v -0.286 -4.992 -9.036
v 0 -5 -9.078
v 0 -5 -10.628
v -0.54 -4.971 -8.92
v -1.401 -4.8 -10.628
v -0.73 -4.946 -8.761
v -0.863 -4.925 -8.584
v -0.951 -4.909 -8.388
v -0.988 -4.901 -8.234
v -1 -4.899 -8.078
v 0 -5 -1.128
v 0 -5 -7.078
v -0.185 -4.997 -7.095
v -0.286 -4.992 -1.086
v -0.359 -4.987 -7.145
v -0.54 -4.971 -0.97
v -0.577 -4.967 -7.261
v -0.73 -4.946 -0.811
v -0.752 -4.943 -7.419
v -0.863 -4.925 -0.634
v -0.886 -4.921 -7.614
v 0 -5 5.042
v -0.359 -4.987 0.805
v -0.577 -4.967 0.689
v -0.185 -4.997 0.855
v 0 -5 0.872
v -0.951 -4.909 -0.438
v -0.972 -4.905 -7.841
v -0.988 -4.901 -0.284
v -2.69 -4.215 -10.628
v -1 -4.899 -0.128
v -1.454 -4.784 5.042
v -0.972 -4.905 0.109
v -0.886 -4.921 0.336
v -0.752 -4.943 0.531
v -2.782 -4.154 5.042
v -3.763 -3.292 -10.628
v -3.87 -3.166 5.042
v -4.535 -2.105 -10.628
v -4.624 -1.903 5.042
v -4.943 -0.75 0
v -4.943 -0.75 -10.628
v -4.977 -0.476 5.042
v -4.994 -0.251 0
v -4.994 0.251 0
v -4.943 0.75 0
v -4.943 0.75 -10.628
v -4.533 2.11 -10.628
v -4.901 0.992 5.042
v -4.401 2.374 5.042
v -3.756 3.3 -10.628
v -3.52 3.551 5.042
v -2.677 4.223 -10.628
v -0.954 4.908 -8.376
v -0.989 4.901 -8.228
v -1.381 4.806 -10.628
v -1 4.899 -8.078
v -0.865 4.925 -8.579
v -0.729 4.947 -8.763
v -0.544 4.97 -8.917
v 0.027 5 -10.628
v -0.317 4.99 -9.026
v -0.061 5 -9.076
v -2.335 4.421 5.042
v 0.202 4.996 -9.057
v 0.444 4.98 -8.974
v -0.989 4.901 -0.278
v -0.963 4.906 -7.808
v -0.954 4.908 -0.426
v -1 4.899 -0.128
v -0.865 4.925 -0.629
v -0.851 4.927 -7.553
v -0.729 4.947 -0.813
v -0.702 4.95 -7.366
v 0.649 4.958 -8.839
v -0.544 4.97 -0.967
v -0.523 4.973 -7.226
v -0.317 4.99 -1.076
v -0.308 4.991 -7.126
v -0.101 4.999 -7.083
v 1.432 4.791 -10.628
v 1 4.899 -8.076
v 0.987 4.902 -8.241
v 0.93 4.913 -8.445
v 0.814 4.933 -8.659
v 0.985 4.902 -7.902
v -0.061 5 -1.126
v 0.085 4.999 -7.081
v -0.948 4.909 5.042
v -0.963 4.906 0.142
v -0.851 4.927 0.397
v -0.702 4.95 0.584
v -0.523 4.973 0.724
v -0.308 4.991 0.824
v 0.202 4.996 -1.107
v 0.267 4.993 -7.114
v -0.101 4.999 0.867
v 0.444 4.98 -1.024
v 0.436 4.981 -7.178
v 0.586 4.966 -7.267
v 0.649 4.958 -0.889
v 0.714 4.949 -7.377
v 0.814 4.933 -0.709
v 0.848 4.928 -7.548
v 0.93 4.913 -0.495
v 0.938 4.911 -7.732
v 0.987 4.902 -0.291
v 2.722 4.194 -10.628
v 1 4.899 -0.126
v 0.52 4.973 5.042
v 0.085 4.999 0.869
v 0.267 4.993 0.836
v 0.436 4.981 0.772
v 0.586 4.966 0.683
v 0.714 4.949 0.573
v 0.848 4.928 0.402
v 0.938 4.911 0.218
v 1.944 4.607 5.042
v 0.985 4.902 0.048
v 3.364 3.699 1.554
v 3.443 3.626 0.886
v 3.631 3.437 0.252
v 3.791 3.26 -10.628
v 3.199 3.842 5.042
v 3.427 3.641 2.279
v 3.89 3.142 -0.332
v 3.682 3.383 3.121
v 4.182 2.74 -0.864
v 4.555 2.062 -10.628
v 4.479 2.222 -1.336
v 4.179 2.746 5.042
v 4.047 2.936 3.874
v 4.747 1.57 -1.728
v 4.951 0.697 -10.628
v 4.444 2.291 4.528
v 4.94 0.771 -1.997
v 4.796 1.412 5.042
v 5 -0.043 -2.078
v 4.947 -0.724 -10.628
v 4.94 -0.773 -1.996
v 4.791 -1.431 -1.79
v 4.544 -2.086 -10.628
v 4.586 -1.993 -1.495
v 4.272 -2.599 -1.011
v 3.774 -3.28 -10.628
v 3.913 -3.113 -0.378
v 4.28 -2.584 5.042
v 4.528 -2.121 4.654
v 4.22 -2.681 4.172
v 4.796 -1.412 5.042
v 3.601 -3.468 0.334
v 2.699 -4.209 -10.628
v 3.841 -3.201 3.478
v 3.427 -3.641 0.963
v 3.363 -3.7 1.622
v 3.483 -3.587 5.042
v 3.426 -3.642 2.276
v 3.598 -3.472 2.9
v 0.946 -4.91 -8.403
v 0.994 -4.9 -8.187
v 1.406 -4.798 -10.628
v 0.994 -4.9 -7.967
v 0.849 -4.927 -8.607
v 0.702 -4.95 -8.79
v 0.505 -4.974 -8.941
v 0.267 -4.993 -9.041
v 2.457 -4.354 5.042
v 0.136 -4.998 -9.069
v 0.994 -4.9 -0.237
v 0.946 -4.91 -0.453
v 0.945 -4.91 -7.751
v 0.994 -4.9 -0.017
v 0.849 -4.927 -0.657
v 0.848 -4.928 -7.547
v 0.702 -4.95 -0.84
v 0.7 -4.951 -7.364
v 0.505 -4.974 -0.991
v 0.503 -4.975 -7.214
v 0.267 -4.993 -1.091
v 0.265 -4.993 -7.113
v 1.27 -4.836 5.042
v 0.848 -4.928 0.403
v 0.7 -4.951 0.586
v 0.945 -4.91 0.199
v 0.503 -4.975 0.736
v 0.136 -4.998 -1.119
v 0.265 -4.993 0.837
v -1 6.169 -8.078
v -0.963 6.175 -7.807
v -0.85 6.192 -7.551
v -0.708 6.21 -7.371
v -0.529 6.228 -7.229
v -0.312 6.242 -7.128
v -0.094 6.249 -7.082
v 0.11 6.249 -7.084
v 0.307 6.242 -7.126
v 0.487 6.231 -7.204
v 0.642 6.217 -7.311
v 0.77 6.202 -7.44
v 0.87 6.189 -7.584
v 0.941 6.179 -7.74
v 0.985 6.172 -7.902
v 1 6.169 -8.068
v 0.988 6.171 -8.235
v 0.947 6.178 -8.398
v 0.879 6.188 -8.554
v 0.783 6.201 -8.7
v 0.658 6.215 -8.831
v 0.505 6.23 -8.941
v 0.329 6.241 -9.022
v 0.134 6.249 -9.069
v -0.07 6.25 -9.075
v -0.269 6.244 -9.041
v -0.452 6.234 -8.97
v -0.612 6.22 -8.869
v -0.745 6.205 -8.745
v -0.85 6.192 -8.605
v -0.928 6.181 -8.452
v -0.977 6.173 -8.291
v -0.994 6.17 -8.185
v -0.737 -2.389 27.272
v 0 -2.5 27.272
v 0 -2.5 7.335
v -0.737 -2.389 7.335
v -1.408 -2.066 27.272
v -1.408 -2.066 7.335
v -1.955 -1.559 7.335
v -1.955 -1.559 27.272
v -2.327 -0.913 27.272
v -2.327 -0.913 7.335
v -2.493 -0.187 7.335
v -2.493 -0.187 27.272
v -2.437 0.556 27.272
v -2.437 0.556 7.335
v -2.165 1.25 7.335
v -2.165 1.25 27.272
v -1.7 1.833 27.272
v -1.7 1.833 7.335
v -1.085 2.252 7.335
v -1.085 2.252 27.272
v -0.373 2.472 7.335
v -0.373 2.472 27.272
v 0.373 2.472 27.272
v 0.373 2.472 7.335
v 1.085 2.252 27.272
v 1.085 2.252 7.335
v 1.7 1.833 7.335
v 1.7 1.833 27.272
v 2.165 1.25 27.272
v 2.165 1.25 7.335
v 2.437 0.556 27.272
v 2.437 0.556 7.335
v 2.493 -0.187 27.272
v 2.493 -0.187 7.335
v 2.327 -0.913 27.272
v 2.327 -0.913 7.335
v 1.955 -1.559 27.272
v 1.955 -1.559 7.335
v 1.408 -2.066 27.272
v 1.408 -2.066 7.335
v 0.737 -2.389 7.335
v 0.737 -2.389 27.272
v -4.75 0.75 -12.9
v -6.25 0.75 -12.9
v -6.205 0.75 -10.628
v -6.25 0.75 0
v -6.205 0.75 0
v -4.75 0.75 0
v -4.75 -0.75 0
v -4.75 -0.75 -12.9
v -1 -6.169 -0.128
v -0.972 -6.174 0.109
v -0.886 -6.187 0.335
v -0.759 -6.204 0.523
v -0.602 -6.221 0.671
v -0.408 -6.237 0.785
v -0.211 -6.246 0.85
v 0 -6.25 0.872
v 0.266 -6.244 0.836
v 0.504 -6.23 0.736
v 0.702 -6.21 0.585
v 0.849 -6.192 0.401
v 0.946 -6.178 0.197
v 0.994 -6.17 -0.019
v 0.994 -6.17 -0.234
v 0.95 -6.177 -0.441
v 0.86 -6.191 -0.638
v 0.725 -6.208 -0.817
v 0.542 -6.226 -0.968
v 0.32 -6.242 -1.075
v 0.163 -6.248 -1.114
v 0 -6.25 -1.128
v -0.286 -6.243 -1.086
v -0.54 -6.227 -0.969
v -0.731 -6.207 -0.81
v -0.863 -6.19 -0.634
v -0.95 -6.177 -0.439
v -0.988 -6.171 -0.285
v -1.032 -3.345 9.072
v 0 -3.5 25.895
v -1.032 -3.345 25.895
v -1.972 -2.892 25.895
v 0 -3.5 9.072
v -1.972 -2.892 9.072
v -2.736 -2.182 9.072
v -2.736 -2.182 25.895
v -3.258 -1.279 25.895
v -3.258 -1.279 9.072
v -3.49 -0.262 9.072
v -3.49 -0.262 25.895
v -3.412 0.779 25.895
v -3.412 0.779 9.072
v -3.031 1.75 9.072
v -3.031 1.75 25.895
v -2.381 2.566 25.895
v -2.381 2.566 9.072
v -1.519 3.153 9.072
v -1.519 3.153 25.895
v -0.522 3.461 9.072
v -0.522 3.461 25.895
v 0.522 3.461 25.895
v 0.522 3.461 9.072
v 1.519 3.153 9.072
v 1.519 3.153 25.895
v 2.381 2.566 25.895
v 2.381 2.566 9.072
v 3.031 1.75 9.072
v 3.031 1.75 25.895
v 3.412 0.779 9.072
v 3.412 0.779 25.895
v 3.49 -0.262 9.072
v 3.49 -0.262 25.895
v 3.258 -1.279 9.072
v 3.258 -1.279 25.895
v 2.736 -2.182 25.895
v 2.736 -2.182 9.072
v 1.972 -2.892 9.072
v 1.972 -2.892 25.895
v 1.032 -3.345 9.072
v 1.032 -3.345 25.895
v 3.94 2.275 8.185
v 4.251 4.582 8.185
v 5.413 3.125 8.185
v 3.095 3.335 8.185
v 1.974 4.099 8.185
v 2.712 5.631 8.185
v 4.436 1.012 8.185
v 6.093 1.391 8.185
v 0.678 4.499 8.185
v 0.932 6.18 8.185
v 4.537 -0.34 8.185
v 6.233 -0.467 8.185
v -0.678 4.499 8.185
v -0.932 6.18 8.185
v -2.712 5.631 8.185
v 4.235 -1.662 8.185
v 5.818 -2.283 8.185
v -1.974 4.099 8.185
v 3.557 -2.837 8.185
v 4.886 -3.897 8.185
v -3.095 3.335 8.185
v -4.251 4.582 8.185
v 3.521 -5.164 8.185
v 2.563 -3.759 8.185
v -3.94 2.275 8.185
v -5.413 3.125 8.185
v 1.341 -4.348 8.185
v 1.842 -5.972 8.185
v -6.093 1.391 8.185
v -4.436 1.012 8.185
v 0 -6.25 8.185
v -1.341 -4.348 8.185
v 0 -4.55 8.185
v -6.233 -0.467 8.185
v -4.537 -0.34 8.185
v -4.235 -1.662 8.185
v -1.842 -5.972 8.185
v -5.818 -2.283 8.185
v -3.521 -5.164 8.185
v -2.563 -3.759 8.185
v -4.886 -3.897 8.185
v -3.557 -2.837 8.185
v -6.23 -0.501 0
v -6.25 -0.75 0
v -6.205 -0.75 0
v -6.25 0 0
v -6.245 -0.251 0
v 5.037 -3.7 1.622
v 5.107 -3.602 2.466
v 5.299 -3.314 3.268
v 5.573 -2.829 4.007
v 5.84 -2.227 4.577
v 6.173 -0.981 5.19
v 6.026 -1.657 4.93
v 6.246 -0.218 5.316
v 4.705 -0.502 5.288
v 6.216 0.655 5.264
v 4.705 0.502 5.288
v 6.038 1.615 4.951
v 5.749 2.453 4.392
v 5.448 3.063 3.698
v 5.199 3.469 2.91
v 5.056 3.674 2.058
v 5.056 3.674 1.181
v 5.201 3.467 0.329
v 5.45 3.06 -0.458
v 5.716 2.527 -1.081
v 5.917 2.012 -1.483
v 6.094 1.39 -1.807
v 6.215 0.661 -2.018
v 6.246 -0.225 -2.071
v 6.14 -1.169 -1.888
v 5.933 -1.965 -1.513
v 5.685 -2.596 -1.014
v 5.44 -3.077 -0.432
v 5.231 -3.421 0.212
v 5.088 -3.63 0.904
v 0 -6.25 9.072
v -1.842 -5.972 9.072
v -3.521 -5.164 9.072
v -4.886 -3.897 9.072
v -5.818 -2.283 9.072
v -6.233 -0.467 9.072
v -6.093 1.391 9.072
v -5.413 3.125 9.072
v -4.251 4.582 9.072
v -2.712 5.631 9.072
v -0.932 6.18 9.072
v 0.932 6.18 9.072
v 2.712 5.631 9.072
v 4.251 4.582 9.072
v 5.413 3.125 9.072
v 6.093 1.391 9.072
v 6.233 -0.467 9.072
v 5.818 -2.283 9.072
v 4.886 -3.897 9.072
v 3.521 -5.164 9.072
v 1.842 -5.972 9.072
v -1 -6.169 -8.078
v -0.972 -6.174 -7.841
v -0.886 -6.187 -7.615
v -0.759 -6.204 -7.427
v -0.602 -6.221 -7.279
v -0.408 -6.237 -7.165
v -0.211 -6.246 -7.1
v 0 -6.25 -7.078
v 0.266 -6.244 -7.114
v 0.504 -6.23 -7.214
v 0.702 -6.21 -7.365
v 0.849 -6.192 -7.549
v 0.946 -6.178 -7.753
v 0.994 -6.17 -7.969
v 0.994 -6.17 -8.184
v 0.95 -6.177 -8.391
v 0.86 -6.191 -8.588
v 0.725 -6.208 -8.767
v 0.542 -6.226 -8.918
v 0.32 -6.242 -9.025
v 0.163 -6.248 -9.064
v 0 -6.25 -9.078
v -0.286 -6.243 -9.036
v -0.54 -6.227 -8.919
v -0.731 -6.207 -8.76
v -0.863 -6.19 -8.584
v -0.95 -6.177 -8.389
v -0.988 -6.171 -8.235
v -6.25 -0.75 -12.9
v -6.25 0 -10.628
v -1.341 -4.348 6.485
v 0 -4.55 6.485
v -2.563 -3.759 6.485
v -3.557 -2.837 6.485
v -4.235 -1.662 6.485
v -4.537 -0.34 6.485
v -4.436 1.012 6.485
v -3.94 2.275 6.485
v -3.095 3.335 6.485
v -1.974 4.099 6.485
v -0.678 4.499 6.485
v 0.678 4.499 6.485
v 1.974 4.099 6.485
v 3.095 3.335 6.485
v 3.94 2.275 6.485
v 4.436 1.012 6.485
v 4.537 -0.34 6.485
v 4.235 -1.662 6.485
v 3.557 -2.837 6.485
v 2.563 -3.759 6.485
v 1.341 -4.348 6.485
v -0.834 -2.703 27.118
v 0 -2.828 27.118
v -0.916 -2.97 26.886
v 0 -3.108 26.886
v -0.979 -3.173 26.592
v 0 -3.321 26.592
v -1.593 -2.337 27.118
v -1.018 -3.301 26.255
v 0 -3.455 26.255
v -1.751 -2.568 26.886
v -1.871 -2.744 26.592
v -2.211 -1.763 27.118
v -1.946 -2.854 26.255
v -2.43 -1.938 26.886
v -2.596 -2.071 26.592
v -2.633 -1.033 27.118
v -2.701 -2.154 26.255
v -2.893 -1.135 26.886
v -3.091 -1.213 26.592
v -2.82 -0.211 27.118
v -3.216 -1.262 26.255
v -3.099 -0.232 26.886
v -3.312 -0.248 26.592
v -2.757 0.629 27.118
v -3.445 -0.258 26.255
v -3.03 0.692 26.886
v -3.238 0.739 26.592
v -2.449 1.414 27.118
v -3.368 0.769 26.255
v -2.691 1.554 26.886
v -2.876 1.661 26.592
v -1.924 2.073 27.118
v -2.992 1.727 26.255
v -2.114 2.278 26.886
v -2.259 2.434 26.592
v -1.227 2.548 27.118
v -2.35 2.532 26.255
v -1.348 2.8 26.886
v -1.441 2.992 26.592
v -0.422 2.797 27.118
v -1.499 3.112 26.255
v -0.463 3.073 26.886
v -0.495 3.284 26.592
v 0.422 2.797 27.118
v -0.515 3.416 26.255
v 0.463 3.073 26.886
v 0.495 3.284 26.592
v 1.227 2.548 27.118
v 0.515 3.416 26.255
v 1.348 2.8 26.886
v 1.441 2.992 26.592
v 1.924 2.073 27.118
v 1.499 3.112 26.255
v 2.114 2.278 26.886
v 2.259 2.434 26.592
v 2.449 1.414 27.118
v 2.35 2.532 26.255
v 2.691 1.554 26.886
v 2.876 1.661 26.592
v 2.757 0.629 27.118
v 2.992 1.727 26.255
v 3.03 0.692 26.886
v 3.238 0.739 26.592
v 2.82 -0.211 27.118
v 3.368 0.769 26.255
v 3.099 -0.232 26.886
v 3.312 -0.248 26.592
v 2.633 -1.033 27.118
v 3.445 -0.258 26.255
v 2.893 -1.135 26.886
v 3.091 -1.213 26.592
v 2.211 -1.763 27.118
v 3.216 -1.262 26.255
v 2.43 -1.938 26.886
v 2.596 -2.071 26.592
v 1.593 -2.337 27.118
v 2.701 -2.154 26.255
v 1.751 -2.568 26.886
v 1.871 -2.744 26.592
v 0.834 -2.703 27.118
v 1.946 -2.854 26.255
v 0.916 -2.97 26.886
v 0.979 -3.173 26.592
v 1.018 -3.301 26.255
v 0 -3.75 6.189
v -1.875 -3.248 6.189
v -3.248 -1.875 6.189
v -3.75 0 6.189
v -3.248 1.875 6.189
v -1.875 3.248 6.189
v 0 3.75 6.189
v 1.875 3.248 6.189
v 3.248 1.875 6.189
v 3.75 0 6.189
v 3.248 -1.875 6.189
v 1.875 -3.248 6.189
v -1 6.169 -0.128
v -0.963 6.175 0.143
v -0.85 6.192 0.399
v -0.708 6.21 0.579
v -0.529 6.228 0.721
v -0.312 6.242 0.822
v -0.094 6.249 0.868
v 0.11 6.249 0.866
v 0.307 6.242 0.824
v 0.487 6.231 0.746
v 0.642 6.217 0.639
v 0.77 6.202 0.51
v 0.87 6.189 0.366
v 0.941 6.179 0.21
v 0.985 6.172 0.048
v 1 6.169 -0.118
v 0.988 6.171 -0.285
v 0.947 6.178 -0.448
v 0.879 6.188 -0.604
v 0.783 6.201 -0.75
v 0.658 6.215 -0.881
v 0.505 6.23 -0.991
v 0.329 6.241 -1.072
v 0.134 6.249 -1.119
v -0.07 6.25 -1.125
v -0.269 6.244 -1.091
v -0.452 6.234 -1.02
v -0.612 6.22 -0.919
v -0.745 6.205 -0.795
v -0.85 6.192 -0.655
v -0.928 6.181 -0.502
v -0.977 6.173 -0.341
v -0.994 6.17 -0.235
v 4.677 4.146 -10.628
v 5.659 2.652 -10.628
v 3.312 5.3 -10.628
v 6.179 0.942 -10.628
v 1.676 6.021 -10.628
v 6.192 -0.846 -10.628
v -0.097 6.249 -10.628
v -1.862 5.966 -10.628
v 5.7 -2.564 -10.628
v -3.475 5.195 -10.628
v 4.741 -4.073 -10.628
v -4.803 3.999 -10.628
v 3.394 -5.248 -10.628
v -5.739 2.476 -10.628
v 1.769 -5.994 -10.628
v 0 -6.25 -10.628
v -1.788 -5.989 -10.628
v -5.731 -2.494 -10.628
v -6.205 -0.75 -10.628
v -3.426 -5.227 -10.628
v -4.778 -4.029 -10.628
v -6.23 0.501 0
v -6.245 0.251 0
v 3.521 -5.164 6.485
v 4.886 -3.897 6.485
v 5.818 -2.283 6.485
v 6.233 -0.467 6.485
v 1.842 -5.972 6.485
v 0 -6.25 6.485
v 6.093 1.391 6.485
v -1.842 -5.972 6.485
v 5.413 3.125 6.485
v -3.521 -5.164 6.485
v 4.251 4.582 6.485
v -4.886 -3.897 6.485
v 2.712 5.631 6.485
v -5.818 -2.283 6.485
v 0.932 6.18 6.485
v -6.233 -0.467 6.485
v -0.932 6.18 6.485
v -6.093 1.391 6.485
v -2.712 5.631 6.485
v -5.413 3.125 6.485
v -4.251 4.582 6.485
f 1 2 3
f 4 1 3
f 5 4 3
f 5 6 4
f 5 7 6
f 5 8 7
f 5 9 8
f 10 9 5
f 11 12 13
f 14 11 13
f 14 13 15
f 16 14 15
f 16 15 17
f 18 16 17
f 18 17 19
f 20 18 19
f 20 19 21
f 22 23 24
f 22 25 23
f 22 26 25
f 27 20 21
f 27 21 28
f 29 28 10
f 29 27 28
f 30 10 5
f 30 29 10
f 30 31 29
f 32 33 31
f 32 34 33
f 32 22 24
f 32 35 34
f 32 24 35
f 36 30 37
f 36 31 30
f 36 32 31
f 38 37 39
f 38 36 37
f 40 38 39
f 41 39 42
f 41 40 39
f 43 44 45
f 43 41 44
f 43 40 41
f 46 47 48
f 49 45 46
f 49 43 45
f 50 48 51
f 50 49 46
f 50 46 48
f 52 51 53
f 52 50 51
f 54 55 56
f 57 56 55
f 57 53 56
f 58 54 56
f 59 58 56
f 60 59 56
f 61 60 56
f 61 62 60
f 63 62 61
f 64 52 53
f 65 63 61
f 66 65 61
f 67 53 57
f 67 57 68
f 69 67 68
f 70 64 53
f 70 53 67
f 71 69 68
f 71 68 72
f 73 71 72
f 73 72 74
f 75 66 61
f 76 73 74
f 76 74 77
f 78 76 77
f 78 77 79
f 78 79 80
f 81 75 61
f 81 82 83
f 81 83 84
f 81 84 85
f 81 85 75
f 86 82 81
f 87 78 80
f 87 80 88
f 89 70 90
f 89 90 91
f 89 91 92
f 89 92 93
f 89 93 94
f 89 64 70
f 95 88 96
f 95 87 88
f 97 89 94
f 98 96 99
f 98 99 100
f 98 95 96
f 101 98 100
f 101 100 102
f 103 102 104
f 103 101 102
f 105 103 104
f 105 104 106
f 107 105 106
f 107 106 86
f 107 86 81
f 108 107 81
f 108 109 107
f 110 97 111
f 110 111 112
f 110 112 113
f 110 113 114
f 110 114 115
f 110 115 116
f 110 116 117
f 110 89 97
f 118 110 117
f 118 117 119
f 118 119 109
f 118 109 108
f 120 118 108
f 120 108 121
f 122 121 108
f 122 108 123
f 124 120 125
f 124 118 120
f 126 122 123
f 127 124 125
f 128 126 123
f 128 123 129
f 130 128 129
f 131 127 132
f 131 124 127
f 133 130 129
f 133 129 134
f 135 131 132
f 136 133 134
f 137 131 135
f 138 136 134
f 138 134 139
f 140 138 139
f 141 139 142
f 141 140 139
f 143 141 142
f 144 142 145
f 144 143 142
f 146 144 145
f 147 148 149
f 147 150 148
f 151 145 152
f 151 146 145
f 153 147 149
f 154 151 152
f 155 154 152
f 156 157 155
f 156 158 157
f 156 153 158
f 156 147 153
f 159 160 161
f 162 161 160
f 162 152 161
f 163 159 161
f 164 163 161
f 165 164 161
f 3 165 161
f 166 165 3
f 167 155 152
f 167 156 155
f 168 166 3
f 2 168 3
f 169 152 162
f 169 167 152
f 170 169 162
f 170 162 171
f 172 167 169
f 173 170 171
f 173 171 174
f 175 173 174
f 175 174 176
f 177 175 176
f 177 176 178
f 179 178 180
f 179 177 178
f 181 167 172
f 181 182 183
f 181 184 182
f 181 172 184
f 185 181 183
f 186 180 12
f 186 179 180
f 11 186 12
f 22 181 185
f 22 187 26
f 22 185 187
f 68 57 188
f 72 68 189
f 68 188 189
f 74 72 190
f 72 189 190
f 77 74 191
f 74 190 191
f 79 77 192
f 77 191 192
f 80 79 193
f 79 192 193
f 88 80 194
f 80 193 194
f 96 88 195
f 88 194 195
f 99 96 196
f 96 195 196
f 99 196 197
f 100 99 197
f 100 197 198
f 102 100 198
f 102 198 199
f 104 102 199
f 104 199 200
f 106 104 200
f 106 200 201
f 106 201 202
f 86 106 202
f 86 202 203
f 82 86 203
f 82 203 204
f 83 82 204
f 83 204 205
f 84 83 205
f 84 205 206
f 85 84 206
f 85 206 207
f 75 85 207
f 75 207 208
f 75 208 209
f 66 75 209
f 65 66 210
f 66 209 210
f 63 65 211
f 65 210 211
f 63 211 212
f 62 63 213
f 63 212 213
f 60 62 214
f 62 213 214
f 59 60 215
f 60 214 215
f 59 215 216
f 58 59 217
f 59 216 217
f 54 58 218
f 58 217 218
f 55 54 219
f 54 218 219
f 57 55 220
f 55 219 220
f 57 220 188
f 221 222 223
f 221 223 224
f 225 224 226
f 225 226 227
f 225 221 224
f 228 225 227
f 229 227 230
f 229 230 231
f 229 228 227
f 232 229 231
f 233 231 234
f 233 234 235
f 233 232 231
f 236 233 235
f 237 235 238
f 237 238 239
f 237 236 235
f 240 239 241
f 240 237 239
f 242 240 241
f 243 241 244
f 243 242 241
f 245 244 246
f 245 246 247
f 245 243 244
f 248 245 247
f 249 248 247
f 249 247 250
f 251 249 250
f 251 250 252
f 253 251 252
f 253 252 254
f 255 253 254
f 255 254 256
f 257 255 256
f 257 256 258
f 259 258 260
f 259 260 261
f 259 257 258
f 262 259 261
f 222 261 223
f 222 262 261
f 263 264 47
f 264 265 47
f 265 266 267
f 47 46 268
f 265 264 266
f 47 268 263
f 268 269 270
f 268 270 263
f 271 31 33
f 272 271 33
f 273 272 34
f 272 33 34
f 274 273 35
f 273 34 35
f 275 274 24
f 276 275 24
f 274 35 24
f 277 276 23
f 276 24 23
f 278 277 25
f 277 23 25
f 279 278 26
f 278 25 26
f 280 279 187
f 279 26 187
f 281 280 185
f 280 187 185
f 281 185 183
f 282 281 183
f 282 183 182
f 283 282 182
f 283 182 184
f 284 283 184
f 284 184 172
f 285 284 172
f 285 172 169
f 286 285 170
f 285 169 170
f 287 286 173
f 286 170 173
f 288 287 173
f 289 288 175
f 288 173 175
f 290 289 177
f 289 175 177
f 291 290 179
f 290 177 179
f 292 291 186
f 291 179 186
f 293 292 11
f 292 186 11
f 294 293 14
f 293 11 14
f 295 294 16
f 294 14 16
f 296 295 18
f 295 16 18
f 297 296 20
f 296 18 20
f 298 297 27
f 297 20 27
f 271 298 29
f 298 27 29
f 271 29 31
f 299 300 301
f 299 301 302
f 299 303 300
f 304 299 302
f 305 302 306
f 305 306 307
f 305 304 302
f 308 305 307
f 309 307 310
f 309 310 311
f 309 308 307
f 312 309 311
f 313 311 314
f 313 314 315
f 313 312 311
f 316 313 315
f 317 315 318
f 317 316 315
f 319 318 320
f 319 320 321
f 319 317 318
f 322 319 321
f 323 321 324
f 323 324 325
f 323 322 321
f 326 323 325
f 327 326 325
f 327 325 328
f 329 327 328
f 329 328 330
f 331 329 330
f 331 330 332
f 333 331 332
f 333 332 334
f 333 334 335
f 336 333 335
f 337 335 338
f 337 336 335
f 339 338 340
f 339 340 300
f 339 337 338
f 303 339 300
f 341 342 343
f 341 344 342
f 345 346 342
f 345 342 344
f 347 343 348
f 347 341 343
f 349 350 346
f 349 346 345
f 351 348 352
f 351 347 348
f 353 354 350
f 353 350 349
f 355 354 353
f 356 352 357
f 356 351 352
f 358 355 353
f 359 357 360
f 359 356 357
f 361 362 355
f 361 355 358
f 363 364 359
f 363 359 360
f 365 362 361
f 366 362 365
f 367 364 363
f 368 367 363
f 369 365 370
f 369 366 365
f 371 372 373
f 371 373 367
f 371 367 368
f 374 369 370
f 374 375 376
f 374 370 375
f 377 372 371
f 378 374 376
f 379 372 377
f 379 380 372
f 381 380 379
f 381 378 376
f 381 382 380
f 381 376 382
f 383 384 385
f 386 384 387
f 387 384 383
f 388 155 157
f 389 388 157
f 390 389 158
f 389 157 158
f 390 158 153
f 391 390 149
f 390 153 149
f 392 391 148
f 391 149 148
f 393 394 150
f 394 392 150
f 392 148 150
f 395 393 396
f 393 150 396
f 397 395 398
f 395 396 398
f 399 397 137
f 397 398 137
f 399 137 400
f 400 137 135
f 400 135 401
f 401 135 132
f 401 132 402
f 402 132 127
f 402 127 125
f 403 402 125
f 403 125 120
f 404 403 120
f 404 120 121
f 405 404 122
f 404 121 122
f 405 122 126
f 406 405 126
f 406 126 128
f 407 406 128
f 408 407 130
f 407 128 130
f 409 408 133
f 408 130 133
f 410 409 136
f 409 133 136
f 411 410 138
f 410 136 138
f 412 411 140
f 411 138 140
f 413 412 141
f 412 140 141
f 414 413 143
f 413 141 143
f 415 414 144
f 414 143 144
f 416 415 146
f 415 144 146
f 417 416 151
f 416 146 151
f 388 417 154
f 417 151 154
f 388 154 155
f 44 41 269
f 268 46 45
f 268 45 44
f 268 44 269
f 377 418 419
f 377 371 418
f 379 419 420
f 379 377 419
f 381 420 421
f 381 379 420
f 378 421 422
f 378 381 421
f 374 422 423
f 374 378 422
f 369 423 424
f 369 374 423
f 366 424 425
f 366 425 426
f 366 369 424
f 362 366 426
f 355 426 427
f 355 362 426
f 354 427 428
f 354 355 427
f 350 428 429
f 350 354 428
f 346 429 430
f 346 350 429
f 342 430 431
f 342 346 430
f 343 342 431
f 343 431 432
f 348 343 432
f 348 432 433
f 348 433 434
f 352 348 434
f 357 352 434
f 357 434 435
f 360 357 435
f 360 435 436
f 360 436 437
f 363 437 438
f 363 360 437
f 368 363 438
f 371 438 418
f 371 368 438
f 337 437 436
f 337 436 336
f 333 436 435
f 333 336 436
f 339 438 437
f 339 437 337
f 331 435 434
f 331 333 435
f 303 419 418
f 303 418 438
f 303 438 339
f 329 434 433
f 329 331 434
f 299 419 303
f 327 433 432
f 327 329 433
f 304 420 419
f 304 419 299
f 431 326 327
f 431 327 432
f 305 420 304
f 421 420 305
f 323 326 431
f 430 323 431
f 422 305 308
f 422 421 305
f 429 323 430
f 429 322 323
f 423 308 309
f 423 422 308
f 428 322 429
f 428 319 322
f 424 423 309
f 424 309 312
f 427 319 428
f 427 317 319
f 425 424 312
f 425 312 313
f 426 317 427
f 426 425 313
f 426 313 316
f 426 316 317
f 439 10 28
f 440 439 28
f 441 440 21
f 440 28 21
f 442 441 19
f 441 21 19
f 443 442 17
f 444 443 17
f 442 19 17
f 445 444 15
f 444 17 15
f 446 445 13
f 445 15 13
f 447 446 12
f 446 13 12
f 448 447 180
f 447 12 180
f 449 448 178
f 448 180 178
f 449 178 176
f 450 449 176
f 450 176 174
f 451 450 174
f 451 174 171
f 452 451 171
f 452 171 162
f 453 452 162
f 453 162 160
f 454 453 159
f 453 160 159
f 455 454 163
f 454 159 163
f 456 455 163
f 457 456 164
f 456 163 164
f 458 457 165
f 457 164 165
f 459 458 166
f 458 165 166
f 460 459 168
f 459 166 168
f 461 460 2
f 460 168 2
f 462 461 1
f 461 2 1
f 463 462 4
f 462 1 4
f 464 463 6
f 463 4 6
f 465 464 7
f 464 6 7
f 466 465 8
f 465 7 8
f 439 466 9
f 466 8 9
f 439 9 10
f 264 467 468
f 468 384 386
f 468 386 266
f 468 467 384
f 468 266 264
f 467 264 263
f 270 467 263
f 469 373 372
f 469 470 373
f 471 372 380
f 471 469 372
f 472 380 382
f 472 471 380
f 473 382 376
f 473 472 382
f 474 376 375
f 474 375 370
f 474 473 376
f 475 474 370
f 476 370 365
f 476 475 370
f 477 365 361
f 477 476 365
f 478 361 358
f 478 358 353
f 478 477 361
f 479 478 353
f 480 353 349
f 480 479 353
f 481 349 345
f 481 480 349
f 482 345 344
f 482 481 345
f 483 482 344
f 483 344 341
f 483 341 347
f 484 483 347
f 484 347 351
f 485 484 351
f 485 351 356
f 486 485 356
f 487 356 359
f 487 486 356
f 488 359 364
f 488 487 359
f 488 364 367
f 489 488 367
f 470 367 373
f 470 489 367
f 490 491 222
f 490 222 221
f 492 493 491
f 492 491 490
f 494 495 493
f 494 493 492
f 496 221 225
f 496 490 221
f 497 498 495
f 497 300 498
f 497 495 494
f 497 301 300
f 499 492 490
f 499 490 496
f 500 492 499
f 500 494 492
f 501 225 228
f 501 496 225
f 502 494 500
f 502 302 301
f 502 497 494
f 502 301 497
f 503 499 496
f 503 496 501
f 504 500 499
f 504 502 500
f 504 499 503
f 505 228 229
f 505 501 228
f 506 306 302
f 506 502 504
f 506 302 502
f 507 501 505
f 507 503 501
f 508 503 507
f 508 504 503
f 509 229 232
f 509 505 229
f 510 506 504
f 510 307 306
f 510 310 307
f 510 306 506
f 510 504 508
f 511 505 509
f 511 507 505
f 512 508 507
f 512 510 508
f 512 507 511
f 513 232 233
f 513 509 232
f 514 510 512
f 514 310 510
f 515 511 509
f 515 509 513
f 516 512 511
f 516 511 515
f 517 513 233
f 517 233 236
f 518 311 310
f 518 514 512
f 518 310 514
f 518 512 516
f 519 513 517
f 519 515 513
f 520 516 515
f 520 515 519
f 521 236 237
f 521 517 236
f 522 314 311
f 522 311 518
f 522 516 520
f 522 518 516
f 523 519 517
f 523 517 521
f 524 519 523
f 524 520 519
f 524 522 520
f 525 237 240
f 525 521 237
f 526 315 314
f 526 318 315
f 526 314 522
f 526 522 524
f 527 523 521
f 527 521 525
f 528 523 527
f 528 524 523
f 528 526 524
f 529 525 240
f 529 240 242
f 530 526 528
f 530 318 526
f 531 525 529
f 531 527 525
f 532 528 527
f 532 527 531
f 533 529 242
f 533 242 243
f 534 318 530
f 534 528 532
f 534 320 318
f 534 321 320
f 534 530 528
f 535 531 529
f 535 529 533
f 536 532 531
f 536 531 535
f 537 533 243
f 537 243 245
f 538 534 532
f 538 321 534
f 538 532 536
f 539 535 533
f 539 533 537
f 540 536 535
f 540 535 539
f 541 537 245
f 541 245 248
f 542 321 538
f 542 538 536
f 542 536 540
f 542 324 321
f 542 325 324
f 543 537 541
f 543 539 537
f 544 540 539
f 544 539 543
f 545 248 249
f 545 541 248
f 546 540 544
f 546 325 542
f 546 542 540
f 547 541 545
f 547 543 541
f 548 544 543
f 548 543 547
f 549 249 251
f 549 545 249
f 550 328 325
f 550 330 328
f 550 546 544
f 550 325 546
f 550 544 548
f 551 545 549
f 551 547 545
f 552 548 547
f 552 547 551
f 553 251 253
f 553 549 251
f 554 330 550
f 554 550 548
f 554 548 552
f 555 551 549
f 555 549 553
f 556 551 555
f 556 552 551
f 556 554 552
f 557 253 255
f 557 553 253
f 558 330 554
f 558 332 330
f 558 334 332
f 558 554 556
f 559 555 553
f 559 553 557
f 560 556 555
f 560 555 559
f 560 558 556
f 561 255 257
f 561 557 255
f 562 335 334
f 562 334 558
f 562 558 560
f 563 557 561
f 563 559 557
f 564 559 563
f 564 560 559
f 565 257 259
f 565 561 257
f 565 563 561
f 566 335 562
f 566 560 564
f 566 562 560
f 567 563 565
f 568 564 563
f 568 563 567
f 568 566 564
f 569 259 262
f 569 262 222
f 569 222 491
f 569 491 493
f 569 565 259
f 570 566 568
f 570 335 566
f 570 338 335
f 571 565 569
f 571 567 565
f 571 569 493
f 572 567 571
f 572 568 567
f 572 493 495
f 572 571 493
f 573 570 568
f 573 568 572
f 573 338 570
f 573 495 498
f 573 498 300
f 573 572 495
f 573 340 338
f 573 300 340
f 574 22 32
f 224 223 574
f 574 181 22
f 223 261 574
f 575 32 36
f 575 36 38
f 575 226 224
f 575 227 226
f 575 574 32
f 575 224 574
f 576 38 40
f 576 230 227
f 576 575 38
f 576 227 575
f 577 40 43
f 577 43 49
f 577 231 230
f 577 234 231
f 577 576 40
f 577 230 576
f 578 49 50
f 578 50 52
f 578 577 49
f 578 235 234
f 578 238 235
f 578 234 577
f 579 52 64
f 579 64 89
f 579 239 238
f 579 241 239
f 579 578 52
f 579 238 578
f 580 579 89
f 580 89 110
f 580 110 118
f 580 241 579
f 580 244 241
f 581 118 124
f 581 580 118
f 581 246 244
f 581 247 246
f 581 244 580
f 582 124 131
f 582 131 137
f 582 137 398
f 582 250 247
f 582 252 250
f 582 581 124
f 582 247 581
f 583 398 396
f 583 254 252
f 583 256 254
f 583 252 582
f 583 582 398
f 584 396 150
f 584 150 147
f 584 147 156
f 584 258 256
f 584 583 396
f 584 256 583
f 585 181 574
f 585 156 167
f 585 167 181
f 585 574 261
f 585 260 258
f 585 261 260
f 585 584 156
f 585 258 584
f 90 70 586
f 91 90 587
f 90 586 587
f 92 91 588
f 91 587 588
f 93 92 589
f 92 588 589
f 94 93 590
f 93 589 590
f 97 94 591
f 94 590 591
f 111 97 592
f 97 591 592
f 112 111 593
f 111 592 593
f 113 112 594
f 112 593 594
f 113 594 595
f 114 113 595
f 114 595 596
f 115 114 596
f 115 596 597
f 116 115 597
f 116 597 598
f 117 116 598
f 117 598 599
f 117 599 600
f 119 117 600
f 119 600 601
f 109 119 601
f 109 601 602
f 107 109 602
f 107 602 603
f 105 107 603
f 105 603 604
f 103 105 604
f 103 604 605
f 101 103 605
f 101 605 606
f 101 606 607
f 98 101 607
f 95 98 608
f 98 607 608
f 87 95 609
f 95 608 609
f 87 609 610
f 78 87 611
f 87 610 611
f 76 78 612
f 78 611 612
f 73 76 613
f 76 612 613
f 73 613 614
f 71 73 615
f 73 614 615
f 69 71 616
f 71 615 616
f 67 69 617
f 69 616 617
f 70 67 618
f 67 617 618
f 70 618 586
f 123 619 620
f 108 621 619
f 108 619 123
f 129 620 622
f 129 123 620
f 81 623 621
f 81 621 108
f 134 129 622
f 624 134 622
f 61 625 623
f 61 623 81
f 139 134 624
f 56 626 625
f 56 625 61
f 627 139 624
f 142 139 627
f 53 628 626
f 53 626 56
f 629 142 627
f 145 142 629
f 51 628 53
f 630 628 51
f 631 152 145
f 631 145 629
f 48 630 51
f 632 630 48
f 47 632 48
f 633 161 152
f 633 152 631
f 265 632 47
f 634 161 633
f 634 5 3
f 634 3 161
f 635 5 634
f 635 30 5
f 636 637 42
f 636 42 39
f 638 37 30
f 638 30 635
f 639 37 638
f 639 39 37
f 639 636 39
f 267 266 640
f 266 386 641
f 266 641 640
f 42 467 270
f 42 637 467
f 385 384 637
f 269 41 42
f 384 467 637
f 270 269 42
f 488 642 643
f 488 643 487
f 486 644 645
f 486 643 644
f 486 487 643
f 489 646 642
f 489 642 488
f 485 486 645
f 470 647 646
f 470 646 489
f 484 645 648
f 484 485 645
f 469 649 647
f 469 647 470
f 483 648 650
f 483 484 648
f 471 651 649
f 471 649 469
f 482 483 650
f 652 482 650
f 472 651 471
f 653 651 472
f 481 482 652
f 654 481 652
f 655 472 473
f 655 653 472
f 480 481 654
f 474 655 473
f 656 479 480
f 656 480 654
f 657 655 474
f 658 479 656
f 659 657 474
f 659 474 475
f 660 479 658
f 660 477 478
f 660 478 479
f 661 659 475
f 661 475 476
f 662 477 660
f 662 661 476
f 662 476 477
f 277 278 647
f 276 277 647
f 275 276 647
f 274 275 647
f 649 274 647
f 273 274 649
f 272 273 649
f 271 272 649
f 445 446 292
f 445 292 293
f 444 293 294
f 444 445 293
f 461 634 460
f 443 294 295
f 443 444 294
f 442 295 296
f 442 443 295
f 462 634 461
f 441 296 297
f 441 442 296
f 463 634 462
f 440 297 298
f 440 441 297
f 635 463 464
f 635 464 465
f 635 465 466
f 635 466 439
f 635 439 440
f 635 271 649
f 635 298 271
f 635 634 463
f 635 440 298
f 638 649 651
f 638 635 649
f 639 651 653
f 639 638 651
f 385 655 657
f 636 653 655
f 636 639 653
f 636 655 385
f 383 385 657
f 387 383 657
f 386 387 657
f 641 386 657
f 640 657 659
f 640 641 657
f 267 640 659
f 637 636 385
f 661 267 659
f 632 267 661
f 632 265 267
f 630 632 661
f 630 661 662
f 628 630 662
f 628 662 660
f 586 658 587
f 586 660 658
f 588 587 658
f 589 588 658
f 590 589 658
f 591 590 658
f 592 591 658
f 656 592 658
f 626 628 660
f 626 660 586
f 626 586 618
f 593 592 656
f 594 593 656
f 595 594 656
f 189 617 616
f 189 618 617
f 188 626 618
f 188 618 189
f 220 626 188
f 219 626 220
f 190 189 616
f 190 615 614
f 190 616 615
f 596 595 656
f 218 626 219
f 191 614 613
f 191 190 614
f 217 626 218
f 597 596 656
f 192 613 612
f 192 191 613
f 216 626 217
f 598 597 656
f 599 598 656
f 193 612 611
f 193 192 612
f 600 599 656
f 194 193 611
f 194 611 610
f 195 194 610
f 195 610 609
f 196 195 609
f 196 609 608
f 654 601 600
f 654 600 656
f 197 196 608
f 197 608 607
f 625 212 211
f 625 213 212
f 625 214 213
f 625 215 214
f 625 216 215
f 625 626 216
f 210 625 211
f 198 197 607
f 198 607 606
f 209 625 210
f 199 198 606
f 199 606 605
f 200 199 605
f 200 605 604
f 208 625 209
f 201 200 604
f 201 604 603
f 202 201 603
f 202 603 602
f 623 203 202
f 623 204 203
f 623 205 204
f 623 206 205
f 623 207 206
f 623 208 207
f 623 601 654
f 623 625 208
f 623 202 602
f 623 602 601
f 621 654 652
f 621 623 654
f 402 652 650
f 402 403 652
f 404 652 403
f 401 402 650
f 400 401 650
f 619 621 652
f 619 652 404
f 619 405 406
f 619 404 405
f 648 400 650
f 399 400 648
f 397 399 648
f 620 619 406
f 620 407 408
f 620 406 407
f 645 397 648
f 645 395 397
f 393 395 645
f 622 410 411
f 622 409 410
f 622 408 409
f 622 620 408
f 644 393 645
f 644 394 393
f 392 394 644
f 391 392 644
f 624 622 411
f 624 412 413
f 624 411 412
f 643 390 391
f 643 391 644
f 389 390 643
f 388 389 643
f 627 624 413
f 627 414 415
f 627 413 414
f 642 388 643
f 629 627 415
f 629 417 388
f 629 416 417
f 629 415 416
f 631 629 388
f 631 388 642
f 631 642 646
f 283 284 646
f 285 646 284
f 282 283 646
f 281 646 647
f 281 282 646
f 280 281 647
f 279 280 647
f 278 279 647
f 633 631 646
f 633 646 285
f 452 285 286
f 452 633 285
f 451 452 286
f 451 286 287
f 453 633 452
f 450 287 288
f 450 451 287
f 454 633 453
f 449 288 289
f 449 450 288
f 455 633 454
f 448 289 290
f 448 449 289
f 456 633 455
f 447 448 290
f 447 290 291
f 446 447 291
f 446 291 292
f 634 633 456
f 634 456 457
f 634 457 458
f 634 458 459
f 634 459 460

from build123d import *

# Parameters (mm, degrees)
F5_D      = 7.4
F5_DEPTH  = 2
F5_START  = 2.3628878
F5_TIP    = 2.2231842904
F8_D      = 2
F10_W     = 1.5
F10_H     = 1.7
F11_DEPTH = 1.8
F13_W     = 1.5
F13_H     = 1.5
F14_DEPTH = 12.9


# Not quite as in the source:
# - a fillet or chamfer that OpenCascade refuses, or shapes differently, is made with other operations: its cross-section is extruded or revolved along the edge and cut away or added


with BuildPart() as f1:
    # F0 (on Right) → F1 (revolve)
    with BuildSketch(Plane.YZ):
        Polygon((-2.5, 27.272233048), (-3.5, 27.272233048), (-3.5, 9.072233048), (-6.25, 9.072233048), (-6.25, 8.1851361653), (-4.55, 8.1851361653), (-4.55, 6.4851361653), (-6.25, 6.4851361653), (-6.25, 5.042233048), (-6.25, -10.627766952), (-5, -10.627766952), (-5, 5.042233048), (-2.5, 7.3351361653), align=None)
    revolve(axis=Axis((0, 0, 6.4422870055), (0, 0, -1)))

    # F2: fillet of radius 1.4485281374 on 1 edges, made by hand

    # F2_s1 → F2_t2 (revolve, cut)
    with BuildSketch(Plane.YZ):
        with BuildLine():
            ThreePointArc((-2.5, 27.272233048), (-3.2236363972, 26.7459334429), (-3.5, 25.8948963881))
            Line((-3.5, 25.8948963881), (-3.5, 27.272233048))
            Line((-3.5, 27.272233048), (-2.5, 27.272233048))
        make_face()
    revolve(axis=Axis((0, 0, 27.272233048), (0, 0, -1)), mode=Mode.SUBTRACT)

    # F5
    # its depths count from where the whole tool has entered the part; down to there all is cleared
    with Locations(Plane.YZ.offset(7.4)):
        with Locations((0, 1.622233048)):
            Hole(F5_D / 2, depth=F5_START)
    with Locations(Plane.YZ.offset(7.4).offset(-F5_START)):
        with Locations((0, 1.622233048)):
            Hole(F5_D / 2, depth=F5_DEPTH)
            with Locations((0, 0, -(F5_DEPTH + F5_TIP / 2))):  # 118° drill point
                Cone(0, F5_D / 2, F5_TIP, mode=Mode.SUBTRACT)

    # F8 (through all)
    with Locations(Plane.XZ.offset(7.5)):
        with Locations((0, -8.077766952), (0, -0.127766952)):
            Hole(F8_D / 2)

    # F13 (on Top) → F14 (join)
    with BuildSketch(Plane.XY):
        with Locations((-5.5, 0)):
            Rectangle(F13_W, F13_H)
    extrude(amount=-F14_DEPTH)


with BuildPart() as f11:
    # F10 (on offset) → F11 (new body)
    with BuildSketch(Plane.YZ.offset(-6.27)):
        with Locations((-0.0197449699, -11.4840940437)):
            Rectangle(F10_W, F10_H)
    extrude(amount=F11_DEPTH)


solid = f1.part
